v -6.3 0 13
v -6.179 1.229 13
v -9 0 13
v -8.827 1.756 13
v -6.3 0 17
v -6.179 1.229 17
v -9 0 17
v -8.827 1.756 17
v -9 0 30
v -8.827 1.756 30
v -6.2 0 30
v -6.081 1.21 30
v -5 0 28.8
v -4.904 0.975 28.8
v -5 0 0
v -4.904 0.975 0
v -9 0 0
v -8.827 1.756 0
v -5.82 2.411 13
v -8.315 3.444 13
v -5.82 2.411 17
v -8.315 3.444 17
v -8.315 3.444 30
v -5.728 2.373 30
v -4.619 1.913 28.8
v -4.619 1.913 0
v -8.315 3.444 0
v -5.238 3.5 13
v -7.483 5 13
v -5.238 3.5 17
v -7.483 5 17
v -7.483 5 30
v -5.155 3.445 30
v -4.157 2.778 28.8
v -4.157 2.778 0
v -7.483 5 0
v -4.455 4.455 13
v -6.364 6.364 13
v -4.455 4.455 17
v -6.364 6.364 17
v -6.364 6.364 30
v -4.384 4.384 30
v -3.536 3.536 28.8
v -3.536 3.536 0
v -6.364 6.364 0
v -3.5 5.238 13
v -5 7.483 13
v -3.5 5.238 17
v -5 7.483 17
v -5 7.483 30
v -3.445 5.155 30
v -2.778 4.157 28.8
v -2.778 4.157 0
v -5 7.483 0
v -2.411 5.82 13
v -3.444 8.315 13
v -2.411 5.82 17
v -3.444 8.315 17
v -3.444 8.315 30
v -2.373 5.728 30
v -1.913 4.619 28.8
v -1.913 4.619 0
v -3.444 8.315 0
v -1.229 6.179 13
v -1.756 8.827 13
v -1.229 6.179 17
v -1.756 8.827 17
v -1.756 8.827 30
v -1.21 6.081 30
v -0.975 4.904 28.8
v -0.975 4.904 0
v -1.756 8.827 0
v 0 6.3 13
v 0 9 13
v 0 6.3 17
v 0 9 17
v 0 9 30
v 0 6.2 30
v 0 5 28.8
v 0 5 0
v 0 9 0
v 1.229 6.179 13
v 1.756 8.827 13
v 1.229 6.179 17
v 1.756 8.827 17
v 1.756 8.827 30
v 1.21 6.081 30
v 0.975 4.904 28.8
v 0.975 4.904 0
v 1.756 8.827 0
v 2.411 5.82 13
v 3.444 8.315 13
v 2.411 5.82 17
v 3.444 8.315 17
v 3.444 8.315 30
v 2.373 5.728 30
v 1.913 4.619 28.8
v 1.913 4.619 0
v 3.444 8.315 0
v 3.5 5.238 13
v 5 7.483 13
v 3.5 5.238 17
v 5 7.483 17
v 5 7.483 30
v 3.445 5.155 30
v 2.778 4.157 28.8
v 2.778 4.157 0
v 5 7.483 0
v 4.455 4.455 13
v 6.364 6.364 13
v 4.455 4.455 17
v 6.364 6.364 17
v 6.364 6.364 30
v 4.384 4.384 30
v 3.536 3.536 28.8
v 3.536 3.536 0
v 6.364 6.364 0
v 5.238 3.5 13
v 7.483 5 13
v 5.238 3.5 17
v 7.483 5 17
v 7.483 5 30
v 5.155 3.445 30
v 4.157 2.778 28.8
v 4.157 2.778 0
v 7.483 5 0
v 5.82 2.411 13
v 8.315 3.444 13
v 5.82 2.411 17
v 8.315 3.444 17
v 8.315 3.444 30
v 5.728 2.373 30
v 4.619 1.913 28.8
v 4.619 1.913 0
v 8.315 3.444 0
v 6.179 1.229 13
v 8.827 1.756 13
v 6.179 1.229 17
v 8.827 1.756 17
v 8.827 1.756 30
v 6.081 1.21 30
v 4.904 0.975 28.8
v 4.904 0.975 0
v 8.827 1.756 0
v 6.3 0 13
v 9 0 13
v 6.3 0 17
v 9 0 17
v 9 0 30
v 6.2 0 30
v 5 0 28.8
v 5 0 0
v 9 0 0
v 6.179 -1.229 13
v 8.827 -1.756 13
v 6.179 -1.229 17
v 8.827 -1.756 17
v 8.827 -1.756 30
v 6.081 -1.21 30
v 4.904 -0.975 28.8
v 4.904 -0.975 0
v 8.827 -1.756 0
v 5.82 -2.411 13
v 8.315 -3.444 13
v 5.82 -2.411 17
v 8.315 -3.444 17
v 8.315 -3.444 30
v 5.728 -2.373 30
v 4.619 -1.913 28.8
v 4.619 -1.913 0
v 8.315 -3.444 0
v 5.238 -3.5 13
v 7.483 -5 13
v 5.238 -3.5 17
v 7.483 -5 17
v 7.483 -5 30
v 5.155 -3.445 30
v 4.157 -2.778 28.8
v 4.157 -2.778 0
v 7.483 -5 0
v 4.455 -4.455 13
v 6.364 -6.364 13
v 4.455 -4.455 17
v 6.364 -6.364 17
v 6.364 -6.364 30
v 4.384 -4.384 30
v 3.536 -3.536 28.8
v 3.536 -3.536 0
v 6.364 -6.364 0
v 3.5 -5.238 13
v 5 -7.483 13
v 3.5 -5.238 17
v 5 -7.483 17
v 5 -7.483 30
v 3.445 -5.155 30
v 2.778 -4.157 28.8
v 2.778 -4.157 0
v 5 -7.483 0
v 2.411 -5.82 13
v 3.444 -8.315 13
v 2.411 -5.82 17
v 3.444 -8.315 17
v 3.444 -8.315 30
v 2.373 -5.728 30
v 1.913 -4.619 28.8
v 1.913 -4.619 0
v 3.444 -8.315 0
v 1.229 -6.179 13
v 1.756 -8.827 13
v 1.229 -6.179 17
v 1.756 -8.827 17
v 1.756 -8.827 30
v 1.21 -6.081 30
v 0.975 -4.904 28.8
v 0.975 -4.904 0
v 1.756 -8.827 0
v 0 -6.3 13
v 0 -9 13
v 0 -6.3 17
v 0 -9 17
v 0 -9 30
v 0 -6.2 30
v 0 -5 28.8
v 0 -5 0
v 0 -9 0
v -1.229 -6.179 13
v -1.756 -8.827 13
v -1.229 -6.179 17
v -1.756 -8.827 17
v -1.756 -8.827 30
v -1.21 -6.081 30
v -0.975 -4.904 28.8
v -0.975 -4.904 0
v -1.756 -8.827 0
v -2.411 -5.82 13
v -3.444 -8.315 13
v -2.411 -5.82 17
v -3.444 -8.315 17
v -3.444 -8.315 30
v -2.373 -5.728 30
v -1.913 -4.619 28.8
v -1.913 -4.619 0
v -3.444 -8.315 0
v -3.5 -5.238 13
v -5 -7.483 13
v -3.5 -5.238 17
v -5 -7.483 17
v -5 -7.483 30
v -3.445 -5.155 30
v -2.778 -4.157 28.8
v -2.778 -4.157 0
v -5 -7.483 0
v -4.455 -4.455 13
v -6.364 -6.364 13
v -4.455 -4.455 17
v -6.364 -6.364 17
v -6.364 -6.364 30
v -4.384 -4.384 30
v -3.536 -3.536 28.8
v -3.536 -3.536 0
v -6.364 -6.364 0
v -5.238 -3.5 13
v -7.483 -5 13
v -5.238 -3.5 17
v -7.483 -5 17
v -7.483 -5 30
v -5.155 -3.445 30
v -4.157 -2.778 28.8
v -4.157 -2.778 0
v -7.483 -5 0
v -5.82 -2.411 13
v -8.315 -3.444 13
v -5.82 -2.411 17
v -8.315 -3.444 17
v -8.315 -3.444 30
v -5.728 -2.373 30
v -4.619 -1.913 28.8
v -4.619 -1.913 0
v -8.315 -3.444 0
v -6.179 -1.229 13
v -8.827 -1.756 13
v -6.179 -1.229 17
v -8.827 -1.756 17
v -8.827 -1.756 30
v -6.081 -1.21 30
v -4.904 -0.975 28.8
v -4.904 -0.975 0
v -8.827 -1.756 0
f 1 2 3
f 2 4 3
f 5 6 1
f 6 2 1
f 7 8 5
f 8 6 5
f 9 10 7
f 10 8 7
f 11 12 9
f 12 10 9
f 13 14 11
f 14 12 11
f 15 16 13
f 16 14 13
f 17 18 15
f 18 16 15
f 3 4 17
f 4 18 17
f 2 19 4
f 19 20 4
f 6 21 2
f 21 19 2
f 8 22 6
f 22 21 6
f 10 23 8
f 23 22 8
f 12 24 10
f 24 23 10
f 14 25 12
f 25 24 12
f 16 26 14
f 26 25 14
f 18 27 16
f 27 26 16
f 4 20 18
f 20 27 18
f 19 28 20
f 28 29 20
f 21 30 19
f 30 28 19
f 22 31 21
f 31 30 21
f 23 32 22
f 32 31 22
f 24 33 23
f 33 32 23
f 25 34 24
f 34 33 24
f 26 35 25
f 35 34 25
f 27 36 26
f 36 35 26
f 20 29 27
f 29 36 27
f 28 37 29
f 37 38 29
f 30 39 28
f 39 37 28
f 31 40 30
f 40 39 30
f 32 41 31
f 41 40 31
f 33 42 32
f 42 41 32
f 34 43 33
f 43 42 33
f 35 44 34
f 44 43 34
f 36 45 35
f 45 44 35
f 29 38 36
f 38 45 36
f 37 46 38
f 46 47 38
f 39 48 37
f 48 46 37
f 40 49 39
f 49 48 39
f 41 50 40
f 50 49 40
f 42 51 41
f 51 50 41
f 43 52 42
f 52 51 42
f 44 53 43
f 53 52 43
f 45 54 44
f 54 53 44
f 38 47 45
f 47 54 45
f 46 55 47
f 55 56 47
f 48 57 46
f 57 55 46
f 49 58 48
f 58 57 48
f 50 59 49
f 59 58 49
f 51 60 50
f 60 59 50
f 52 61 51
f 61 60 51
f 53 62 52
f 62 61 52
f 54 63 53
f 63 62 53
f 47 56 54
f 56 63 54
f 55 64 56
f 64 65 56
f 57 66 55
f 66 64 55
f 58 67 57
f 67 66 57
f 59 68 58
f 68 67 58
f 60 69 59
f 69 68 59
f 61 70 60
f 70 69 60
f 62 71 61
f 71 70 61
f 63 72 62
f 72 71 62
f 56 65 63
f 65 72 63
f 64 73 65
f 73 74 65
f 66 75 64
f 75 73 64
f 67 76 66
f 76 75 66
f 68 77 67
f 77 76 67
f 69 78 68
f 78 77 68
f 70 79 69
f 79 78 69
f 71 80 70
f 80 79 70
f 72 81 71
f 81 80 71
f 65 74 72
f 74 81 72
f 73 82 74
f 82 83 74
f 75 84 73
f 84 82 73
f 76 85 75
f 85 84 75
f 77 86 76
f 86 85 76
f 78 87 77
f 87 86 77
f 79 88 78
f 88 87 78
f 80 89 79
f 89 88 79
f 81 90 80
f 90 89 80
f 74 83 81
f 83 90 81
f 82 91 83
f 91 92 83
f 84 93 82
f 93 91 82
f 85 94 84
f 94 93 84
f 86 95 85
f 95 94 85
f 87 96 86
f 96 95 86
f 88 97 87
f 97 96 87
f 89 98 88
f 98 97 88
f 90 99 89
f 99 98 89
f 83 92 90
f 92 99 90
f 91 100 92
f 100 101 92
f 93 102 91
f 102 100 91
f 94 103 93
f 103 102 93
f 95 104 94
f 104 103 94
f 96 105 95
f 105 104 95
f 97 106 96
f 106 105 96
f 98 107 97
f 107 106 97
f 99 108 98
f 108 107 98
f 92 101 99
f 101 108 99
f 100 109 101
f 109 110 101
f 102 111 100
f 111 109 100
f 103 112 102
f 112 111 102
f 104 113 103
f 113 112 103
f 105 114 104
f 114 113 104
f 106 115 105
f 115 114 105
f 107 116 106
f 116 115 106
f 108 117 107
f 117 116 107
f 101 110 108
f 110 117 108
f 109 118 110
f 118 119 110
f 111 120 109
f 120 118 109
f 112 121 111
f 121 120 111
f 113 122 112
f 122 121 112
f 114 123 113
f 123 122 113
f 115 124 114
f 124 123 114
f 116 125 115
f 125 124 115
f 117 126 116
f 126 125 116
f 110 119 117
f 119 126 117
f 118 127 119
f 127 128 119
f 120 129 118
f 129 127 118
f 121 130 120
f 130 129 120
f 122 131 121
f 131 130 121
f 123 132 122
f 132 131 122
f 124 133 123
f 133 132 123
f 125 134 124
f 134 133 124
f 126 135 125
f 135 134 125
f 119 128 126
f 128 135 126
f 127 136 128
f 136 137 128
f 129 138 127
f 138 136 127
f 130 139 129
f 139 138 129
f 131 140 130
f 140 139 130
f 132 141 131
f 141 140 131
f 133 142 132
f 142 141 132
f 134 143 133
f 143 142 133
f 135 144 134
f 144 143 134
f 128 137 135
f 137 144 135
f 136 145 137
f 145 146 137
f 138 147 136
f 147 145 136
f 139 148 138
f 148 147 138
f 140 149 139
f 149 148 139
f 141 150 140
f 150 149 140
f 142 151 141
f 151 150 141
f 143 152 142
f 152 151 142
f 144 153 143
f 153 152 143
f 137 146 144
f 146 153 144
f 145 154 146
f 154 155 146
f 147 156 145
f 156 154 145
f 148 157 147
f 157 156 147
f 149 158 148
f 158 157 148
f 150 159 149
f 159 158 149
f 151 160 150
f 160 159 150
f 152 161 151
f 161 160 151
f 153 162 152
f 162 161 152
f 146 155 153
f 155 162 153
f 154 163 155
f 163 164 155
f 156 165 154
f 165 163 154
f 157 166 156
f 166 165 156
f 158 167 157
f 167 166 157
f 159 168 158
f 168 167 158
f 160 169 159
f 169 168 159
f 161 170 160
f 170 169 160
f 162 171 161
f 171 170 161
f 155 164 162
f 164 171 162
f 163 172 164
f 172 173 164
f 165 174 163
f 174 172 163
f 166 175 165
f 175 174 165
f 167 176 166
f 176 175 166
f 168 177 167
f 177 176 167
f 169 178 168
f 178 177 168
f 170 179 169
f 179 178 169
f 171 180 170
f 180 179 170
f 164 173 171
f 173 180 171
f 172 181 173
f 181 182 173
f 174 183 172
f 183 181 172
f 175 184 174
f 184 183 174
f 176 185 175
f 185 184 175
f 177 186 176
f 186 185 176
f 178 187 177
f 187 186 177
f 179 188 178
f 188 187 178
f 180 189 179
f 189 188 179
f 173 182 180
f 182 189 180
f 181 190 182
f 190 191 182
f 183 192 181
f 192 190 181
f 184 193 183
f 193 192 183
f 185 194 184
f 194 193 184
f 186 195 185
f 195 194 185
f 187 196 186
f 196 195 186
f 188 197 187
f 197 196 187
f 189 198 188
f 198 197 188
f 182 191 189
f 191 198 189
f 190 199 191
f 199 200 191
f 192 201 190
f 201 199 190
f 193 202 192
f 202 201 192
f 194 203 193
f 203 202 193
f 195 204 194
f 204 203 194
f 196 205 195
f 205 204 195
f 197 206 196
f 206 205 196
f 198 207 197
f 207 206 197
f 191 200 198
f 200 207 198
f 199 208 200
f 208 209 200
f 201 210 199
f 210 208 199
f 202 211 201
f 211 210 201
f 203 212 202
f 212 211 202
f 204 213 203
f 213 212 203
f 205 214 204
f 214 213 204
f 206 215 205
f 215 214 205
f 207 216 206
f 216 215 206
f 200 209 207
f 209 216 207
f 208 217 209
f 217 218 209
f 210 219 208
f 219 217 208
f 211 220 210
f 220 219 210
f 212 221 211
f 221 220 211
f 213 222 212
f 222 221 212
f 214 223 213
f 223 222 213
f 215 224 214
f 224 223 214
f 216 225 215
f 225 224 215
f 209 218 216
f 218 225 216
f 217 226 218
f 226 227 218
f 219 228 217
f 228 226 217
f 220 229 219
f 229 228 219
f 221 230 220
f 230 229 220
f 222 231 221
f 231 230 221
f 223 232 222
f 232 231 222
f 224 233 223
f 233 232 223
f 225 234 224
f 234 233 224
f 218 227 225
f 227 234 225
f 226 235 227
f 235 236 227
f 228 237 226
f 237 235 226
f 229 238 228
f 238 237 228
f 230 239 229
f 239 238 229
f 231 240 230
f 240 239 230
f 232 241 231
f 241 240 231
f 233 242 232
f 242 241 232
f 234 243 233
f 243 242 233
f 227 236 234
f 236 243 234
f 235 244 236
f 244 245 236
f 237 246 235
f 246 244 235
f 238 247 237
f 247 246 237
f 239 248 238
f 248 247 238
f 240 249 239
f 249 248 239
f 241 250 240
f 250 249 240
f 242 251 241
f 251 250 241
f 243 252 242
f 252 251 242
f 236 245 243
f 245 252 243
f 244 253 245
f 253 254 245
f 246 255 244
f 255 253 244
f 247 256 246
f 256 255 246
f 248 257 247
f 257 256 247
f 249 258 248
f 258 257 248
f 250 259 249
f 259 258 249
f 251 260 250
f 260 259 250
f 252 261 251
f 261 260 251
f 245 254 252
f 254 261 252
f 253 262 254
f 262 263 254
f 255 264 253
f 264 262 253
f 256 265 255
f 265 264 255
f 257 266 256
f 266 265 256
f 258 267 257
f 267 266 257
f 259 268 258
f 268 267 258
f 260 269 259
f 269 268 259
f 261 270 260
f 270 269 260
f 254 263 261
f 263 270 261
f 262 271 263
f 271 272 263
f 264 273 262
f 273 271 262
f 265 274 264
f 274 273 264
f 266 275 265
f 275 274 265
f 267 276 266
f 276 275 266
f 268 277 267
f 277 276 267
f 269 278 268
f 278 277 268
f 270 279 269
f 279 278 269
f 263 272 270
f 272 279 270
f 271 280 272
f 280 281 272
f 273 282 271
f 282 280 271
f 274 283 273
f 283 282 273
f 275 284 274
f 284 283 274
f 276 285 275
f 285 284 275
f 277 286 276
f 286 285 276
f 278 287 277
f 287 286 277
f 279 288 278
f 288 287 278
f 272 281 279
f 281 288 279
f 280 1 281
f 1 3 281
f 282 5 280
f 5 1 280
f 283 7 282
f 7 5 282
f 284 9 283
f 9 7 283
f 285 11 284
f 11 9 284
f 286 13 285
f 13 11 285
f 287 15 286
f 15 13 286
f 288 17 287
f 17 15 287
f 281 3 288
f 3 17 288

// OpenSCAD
$fn = 32;

// ----------------------------------------------------------------------
// Grooved revolve: thread_relief, bore R5
// ----------------------------------------------------------------------

// --- parameters (mm) ---
bore_r = 5;               // bore radius
outer_r = 9;              // outer radius of the body
total_h = 30;             // overall height, Z
wall = 4;                 // radial wall thickness
groove_w = 4;             // groove width
groove_d = 2.7;           // groove depth
grooves = 1;              // number of outer grooves
relief = 1.2;             // thread relief leg at the bore mouth
relief_angle = 45;        // thread relief chamfer angle, degrees
fit_tol = 0.05;           // declared fit tolerance (prompt contract)
free_tol = 0.2;           // declared free tolerance (prompt contract)

bbox_x = 2 * outer_r;  // full diameter
bore_d = 2 * bore_r;  // bore diameter
body_d = 2 * outer_r;  // body diameter
revolve_angle = 360;  // full turn around the Z axis

profile = [[5, 0], [9, 0], [9, 13], [6.3, 13], [6.3, 17], [9, 17], [9, 30], [6.2, 30], [5, 28.8]];  // primary outline, 9 points, counter clockwise

// --- the one profile operation ---
rotate_extrude(angle = revolve_angle) polygon(points = profile);
